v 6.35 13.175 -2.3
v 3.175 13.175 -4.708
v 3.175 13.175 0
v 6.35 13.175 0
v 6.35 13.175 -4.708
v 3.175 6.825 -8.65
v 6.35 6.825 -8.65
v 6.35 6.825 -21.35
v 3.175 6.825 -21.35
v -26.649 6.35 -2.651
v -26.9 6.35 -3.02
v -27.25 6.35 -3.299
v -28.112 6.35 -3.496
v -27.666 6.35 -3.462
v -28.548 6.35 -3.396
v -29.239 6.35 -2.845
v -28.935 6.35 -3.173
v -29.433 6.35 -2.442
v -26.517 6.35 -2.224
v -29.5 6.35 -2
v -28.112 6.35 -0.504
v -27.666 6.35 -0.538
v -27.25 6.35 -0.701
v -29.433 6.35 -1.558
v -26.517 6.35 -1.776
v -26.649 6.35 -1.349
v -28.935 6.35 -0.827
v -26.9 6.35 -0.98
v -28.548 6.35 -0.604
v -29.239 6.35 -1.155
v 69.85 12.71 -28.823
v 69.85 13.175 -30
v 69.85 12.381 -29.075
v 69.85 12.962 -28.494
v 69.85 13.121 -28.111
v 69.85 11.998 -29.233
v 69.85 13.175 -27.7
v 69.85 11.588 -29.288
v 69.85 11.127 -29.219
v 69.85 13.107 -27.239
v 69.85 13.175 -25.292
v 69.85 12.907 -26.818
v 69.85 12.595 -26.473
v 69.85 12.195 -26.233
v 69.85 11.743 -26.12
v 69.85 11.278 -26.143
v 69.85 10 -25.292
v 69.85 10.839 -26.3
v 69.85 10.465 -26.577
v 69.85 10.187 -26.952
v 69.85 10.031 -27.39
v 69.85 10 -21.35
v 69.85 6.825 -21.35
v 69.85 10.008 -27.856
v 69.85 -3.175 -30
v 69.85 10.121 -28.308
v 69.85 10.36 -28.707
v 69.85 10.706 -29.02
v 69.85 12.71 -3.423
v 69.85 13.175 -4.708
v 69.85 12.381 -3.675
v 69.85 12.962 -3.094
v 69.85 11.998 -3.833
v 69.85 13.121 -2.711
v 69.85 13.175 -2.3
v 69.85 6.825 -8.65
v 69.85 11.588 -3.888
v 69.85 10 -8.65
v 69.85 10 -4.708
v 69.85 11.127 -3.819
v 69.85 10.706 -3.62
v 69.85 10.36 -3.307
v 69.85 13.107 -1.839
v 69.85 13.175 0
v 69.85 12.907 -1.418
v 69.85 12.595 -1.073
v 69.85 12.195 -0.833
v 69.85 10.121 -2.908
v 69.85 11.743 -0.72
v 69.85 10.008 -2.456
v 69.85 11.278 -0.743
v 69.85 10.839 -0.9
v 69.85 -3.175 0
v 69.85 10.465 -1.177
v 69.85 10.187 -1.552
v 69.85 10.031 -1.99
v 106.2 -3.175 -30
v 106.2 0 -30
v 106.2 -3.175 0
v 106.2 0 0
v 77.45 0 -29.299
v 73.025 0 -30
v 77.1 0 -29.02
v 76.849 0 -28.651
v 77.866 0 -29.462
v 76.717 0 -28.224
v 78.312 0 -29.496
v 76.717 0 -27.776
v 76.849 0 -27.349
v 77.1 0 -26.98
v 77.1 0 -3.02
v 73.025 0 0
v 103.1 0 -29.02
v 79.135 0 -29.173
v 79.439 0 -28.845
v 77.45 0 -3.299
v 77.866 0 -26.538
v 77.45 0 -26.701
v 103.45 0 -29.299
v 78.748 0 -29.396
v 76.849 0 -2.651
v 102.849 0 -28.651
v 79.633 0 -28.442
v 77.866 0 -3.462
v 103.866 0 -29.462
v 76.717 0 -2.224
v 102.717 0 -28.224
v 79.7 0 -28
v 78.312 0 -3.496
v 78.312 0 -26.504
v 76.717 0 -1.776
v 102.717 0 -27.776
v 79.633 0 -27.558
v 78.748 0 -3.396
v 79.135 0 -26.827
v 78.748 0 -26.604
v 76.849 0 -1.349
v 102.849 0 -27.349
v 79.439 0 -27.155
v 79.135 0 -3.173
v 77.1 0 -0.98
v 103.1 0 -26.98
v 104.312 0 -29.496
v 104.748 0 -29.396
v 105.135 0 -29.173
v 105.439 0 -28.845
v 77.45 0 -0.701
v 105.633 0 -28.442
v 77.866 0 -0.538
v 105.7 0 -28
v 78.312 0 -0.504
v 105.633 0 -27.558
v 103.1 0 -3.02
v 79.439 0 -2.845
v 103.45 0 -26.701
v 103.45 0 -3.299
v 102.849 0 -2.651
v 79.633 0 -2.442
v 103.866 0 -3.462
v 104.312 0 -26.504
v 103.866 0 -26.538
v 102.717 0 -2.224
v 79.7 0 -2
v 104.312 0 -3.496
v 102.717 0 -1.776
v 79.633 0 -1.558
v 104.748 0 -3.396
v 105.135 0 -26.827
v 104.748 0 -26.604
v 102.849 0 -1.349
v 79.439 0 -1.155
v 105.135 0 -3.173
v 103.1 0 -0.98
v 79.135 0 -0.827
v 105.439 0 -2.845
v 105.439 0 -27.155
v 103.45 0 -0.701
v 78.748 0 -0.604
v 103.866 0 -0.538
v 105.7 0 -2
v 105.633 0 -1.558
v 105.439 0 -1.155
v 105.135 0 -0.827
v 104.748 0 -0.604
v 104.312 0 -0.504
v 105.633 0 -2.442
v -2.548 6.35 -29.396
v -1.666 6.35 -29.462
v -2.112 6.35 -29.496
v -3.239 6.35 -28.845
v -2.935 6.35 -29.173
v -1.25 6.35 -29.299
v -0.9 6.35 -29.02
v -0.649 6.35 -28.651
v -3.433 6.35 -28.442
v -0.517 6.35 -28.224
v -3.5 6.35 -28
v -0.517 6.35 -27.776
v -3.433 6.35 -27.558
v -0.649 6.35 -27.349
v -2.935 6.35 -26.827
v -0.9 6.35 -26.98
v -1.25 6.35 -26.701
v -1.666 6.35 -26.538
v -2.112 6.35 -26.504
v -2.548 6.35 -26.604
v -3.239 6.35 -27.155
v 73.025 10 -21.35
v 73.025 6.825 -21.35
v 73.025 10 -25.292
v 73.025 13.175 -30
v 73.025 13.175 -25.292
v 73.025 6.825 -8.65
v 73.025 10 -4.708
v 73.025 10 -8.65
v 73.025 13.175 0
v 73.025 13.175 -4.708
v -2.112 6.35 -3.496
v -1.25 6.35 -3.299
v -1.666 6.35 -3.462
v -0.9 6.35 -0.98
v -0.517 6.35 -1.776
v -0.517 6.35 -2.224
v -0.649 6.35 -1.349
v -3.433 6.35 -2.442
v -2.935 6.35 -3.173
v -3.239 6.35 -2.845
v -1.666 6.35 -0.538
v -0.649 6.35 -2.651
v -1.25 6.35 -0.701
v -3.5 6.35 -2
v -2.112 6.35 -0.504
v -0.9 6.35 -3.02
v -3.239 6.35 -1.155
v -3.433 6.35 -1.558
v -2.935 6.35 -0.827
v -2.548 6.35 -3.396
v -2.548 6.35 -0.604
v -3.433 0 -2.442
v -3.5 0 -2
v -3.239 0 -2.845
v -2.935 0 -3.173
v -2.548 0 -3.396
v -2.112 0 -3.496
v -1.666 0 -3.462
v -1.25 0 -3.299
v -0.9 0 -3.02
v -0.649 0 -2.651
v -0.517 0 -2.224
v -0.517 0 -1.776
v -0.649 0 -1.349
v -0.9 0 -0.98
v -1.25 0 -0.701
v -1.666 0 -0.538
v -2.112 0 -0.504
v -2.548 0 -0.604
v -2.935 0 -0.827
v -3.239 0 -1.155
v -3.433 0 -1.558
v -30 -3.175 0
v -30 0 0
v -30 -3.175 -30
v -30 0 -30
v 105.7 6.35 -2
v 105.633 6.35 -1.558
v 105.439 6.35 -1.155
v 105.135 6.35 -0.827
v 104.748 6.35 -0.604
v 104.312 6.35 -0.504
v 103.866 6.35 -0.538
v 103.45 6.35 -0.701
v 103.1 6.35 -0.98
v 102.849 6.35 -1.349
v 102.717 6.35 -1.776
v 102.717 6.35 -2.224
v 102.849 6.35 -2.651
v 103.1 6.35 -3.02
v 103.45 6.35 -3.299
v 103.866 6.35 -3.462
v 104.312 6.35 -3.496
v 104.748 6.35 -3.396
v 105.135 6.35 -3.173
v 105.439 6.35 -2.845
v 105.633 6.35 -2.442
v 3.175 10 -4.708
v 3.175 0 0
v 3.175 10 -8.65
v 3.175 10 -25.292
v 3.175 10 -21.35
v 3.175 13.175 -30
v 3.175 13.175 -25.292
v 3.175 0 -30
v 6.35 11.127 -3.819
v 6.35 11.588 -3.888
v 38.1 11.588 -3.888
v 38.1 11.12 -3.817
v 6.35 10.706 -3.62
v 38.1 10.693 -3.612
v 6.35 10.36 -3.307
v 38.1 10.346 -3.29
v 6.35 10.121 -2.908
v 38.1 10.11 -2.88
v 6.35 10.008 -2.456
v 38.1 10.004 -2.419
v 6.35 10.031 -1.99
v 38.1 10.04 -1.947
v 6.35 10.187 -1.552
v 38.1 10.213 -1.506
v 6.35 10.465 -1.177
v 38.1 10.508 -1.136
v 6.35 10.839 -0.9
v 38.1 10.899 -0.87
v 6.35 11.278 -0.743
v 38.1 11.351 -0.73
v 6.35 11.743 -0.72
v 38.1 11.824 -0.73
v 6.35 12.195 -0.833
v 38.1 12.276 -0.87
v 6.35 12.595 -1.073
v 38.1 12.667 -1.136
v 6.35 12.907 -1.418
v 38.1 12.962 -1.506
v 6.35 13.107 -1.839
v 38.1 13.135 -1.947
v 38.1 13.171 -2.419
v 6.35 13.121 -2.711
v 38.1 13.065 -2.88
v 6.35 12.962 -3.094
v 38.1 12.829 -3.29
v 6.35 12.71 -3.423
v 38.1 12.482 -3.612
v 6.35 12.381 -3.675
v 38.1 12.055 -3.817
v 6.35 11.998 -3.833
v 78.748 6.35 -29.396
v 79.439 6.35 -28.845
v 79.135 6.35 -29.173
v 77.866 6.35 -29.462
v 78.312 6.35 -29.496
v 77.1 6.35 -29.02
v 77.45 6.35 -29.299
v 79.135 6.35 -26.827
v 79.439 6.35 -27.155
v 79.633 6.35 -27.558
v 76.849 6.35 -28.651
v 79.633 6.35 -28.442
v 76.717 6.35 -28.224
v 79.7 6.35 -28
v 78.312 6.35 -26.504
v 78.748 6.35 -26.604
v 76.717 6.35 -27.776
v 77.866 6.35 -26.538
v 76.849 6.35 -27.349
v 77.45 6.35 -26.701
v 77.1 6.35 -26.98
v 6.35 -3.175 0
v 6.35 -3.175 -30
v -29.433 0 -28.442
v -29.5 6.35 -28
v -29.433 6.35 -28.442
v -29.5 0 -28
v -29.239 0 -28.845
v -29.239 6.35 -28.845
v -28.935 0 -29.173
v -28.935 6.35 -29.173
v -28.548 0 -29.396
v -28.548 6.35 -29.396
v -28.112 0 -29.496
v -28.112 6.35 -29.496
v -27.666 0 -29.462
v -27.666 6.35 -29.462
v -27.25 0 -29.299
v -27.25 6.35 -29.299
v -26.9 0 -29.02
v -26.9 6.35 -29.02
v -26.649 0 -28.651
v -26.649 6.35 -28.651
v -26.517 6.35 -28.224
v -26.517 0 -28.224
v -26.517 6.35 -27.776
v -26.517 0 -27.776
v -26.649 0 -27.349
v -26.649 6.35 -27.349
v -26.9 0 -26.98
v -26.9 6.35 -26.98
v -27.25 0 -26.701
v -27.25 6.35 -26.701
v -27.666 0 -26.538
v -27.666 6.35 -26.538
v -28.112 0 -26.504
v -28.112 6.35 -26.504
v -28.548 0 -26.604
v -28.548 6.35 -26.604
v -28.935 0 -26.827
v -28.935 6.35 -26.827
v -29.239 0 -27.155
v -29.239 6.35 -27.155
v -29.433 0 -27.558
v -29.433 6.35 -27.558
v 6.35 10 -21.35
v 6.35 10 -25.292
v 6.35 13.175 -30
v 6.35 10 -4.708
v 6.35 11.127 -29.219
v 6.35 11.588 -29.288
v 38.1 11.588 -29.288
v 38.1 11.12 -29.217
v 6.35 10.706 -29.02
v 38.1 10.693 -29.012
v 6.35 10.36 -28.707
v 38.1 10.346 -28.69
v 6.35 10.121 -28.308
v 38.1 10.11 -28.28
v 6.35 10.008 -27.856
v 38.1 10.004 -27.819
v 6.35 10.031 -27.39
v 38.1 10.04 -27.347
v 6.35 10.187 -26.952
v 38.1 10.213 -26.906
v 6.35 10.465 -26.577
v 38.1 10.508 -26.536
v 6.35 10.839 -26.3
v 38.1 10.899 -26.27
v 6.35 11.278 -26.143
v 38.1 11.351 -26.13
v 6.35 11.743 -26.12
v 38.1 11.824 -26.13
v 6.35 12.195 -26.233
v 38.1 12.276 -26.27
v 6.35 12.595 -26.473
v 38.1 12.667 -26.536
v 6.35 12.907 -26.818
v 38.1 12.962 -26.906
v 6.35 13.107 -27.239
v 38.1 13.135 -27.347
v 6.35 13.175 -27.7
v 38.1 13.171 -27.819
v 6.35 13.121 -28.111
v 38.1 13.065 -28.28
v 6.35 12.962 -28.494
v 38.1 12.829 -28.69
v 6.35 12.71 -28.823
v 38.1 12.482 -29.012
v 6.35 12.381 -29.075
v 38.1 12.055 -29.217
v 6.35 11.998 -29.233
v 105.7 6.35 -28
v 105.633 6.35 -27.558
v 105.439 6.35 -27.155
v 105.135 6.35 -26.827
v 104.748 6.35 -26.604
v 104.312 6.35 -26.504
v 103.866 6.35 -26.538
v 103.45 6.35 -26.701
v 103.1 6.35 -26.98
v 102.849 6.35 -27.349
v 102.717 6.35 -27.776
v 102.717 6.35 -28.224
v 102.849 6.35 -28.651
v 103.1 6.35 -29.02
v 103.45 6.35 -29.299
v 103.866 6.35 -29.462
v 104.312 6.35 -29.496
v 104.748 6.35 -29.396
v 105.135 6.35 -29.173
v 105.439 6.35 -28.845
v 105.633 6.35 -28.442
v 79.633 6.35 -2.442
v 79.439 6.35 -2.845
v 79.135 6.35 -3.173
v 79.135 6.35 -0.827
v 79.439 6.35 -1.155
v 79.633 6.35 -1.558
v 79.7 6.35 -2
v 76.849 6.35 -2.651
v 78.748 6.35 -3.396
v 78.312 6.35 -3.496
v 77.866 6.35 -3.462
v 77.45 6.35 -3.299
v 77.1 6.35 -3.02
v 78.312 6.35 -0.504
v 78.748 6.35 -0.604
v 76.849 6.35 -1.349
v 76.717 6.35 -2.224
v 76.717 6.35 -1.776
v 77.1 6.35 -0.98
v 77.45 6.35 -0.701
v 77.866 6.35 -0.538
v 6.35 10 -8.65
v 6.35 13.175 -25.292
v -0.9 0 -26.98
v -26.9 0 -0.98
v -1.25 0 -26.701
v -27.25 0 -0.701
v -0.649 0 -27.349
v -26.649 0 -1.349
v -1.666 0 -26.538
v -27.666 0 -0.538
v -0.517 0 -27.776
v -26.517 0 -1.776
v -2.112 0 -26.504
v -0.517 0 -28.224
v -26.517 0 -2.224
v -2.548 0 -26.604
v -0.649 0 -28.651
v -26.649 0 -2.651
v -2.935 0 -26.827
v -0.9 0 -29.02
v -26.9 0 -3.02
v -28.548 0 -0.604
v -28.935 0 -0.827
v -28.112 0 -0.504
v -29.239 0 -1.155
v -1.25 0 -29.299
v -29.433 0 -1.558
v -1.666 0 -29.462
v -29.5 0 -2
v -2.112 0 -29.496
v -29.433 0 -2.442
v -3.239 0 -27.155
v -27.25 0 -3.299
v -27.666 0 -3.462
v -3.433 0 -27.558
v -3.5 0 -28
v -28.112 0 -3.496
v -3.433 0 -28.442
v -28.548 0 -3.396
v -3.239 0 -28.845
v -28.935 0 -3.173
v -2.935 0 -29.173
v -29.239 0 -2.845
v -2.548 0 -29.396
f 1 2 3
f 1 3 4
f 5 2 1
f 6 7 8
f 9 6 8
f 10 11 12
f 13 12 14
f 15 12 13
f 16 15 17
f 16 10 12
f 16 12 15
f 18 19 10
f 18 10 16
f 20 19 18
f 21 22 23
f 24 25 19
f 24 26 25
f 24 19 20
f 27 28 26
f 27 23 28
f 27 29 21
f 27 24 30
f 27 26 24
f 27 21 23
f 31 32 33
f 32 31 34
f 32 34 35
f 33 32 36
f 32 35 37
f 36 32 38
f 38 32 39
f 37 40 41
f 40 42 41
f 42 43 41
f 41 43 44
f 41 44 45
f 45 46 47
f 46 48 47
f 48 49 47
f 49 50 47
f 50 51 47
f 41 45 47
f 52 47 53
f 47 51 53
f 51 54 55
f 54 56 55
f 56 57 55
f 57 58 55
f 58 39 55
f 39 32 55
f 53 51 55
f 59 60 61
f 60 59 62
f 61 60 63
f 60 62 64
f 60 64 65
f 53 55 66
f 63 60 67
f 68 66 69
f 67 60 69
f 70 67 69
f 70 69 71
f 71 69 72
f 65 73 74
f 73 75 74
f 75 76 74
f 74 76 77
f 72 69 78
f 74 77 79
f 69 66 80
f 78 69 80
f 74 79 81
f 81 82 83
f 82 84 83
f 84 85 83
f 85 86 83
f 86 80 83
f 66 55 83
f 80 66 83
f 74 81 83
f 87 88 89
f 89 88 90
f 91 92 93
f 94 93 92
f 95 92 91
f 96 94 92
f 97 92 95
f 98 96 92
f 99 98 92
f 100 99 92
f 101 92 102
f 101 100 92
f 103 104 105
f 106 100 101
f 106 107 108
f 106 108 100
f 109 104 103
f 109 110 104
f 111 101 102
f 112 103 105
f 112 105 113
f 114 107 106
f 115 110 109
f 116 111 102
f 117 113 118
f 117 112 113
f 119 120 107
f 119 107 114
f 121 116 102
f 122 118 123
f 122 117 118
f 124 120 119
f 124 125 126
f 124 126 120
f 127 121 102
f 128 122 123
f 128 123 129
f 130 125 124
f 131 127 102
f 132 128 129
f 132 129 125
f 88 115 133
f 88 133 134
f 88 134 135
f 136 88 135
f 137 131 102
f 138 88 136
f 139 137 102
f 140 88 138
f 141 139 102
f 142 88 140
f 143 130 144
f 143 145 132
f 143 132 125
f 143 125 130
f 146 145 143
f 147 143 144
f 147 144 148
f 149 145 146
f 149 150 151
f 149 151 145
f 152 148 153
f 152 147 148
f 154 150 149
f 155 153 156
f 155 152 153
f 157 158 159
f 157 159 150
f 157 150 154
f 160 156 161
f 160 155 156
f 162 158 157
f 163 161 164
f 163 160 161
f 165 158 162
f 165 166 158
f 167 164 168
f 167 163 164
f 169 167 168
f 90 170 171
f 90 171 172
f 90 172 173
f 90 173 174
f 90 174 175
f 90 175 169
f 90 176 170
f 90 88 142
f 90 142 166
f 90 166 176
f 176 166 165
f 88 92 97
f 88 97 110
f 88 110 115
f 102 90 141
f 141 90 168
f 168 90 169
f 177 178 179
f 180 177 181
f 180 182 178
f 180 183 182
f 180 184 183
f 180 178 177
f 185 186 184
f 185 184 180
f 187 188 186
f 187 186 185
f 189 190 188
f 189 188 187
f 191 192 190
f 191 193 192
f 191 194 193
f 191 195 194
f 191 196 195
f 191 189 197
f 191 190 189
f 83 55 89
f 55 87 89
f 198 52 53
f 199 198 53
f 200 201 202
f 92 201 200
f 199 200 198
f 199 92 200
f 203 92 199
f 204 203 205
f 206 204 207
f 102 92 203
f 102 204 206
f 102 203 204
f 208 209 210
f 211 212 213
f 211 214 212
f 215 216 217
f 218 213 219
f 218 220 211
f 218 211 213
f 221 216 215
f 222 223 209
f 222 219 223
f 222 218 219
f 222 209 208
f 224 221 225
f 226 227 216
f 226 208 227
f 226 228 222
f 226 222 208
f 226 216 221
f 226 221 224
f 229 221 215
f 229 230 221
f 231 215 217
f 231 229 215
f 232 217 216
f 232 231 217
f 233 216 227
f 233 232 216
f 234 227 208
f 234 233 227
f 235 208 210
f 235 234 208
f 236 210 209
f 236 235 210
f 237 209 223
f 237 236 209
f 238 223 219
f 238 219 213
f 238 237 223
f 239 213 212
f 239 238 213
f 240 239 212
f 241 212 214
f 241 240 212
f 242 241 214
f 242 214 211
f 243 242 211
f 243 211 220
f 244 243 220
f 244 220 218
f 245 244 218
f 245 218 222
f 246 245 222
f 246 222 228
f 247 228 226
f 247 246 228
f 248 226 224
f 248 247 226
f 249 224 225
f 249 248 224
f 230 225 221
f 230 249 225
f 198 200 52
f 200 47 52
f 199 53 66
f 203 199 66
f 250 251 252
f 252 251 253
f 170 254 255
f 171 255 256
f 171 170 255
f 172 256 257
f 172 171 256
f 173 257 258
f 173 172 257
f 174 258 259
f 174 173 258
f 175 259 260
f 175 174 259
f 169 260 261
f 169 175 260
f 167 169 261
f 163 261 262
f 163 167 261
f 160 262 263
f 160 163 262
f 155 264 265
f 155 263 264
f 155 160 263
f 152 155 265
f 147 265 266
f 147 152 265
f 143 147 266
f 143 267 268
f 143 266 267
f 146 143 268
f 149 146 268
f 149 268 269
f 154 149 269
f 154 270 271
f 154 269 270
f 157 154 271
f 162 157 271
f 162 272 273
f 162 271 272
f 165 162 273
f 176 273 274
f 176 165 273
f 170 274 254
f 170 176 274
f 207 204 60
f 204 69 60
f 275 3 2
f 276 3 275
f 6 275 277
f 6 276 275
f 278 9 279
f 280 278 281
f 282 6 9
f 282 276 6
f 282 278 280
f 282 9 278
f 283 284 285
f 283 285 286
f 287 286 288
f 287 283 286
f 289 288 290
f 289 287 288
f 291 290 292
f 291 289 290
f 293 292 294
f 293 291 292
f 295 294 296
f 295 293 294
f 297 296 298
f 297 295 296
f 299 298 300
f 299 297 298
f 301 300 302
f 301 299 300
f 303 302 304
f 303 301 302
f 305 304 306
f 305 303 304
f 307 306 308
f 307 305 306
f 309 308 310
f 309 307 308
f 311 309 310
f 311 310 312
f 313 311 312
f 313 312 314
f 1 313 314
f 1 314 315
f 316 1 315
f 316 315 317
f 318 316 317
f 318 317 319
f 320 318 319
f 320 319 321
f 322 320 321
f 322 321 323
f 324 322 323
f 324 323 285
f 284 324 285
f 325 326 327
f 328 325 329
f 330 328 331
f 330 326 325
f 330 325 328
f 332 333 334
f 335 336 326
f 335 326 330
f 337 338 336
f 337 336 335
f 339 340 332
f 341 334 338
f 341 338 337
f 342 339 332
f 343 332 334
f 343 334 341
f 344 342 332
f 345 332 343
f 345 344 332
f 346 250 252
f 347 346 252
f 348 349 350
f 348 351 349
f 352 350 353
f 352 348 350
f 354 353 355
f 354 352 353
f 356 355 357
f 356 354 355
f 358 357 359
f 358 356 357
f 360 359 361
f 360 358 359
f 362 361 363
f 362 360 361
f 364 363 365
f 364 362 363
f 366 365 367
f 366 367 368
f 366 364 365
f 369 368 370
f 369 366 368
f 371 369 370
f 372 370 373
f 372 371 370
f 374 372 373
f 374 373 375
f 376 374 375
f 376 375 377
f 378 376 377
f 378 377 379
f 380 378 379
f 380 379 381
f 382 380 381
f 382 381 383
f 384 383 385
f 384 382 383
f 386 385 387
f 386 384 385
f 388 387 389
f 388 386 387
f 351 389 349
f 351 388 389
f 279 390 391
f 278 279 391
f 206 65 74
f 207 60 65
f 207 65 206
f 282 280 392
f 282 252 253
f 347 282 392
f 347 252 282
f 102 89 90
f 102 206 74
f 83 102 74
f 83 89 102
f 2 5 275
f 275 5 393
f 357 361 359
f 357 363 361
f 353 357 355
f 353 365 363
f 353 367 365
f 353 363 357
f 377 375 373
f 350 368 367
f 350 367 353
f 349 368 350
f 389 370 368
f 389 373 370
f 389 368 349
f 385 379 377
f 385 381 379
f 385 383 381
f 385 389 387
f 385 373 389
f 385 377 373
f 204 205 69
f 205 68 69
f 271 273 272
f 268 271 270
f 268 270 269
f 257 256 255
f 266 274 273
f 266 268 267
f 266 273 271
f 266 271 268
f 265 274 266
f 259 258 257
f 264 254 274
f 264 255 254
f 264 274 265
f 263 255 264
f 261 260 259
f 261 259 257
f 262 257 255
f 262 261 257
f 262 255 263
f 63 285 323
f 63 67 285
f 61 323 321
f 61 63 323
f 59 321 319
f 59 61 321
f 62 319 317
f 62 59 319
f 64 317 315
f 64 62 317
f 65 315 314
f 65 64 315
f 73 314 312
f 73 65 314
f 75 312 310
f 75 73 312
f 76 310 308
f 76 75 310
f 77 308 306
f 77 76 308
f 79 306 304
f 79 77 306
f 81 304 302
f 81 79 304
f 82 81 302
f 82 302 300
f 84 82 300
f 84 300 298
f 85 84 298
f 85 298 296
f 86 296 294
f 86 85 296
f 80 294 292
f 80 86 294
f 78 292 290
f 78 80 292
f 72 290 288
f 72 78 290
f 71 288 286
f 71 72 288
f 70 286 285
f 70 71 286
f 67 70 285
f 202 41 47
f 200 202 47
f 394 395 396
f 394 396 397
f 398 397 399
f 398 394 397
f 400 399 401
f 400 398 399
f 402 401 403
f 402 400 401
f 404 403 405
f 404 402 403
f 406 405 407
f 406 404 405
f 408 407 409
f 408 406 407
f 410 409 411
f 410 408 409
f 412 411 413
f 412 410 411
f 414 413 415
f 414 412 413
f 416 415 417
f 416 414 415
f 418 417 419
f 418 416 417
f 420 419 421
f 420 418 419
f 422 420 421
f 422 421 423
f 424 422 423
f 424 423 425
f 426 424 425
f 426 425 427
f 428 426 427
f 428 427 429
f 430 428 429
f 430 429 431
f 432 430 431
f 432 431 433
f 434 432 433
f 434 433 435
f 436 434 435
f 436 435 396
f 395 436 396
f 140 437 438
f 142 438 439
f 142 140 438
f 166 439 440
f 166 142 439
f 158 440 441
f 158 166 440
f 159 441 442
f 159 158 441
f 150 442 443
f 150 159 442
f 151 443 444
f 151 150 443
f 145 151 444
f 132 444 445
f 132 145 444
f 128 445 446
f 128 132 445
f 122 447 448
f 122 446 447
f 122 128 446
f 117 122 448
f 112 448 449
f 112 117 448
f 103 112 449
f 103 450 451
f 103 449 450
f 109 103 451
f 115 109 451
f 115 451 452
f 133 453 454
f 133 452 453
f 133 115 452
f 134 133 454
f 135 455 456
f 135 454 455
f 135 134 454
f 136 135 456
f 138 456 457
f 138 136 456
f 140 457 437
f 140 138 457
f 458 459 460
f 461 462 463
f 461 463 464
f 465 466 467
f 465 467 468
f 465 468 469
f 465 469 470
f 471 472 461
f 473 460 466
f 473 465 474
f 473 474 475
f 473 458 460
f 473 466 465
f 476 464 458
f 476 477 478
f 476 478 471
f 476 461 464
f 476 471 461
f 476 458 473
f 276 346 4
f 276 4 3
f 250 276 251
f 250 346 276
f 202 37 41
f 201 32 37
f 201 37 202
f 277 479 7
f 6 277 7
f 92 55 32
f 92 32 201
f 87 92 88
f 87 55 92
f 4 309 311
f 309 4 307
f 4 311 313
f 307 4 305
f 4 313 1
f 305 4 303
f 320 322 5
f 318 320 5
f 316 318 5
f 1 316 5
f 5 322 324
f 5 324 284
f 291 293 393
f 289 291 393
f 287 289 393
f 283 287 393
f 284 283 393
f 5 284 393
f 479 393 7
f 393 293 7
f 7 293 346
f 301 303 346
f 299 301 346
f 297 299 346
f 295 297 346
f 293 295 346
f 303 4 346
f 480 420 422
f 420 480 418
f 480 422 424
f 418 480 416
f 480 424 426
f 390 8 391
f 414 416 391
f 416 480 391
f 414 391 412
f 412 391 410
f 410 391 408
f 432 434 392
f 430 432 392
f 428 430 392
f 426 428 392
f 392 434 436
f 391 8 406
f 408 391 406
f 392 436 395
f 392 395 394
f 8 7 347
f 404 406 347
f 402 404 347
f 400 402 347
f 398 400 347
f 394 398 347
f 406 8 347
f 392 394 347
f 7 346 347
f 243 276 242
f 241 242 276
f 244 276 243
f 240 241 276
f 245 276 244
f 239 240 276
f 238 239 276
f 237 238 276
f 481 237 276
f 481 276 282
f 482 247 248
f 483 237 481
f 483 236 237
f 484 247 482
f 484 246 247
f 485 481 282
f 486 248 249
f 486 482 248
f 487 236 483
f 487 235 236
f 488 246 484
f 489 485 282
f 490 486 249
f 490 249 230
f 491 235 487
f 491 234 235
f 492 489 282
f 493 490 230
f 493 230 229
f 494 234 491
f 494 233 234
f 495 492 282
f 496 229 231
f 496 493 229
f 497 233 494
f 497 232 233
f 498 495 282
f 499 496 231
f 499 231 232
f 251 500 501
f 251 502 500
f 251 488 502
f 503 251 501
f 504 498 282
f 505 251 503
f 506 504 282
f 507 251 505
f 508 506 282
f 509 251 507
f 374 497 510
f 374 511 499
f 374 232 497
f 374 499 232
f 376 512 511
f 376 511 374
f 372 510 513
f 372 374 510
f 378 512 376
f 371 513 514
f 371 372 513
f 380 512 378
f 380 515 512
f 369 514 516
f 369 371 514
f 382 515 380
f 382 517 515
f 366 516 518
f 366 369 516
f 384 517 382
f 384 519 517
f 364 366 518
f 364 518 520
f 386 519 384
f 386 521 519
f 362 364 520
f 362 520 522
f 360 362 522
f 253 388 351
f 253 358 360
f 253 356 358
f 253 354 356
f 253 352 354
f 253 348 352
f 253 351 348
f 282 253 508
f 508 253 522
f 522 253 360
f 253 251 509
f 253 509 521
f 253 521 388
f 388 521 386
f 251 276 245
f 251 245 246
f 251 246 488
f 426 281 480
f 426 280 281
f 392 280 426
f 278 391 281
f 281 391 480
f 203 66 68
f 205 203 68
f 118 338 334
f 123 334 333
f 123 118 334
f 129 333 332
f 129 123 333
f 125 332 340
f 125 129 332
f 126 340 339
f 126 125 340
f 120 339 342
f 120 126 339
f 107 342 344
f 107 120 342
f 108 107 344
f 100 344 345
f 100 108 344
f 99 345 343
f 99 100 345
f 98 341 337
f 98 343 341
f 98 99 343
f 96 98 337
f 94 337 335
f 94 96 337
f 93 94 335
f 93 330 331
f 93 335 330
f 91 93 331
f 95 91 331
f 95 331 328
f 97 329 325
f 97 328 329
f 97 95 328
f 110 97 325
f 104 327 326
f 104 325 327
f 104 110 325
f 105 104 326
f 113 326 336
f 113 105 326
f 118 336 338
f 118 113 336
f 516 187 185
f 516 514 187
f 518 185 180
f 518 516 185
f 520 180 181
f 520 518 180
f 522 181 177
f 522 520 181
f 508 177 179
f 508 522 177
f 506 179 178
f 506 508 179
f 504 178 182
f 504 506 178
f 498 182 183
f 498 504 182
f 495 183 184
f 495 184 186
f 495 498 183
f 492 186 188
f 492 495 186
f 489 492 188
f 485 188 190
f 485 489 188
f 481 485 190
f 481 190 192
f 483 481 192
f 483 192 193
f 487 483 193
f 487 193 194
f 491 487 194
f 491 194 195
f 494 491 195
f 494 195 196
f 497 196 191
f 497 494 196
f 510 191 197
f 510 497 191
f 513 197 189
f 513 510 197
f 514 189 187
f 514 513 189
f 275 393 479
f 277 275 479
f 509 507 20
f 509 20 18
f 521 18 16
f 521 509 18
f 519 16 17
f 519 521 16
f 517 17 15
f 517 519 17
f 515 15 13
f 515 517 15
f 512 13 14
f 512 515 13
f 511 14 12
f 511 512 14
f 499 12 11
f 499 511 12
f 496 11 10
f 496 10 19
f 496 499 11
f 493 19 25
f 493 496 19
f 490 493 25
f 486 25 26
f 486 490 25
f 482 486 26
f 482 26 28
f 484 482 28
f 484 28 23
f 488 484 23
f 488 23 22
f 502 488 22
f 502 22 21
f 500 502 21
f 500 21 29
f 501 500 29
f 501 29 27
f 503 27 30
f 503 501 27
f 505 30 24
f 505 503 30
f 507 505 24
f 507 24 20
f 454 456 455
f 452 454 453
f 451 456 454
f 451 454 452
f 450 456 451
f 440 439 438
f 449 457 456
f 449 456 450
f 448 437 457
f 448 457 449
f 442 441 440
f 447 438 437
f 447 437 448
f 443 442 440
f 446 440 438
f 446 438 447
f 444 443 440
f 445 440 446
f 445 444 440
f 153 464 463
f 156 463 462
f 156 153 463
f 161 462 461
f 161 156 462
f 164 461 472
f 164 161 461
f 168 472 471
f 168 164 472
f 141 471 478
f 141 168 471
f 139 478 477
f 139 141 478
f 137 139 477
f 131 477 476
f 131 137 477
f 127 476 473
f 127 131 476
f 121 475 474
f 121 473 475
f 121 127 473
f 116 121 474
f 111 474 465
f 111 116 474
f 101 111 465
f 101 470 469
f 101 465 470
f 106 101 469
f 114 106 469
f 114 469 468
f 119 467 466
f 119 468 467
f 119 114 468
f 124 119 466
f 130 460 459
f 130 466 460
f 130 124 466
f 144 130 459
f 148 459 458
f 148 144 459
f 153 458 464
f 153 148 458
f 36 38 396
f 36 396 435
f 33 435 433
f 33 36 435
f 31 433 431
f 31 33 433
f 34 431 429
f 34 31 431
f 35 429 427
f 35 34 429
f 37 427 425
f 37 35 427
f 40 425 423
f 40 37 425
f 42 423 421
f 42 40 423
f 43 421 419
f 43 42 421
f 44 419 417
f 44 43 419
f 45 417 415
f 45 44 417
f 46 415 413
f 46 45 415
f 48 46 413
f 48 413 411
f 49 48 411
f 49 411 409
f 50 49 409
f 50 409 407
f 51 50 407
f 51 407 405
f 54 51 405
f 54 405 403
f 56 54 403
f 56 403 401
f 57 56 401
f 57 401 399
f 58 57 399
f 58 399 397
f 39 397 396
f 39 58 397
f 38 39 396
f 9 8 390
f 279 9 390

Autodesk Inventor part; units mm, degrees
ref_plane "YZ Plane" through (0, 0, 0) normal (1, 0, 0) x (0, 1, 0)
ref_plane "XZ Plane" through (0, 0, 0) normal (0, 1, 0) x (-1, 0, 0)
ref_plane "XY Plane" through (0, 0, 0) normal (0, 0, 1) x (1, 0, 0)
sketch "Sketch1" plane through (0, 0, 0) normal (0, 1, 0) x (-1, 0, 0)
  line L0 (0, 0) -> (30, 0)
  line L1 (30, 0) -> (30, -30)
  line L2 (30, -30) -> (0, -30)
  line L3 (0, -30) -> (0, 0)
  line L4 (28, -2) -> (2, -2)
  line L5 (2, -2) -> (2, -28)
  line L6 (2, -28) -> (28, -28)
  line L7 (28, -28) -> (28, -2)
  line L8 (28, -2) -> (2, -28) construction
  line L9 (2, -2) -> (28, -28) construction
  circle A0 centre (28, -2) radius 1.5
  circle A1 centre (28, -28) radius 1.5
  circle A2 centre (2, -2) radius 1.5
  circle A3 centre (2, -28) radius 1.5
  point P0 (15, -15)
  dimension "d0" = 30
  dimension "d1" = 30
  dimension "d2" = 26
  dimension "d3" = 26
  dimension "d4" = 3
  dimension "d7" = 26
  dimension "d10" = 26
extrude "Extrusion1" add sketch "Sketch1" against normal blind 3.175 contours L0 L1 L2 L3 | A2 L5 L4 | L4 L5 A2 | L4 A0 L7 A1 L6 A3 L5 A2 | A0 L7 L4 | L4 L7 A0 | A3 L6 L5 | L5 L6 A3 | A1 L6 L7 | L7 L6 A1
extrude "Extrusion2" add sketch "Sketch1" along normal blind 6.35 contours A2 L5 L4 | L4 L5 A2 | A0 L7 L4 | L4 L7 A0 | A3 L6 L5 | L5 L6 A3 | A1 L6 L7 | L7 L6 A1
sketch "Sketch2" plane through (0, 0, 0) normal (1, 0, 0) x (0, 0, -1)
  line L0 (0, 0) -> (0, -3.175) projected
  line L1 (0, 0) -> (30, 0) projected
  line L2 (0, -3.175) -> (30, -3.175)
  line L3 (30, -3.175) -> (30, 0)
  line L4 (30, 0) -> (0, 0)
  line L5 (0, 0) -> (0, -3.175)
extrude "Extrusion3" add sketch "Sketch2" along normal blind 6.35
sketch "Sketch3" plane through (0, 0, 0) normal (0, 1, 0) x (1, 0, 0)
  line L0 (6.35, 0) -> (6.35, 30) projected
  line L1 (-30, 30) -> (6.35, 30) projected
  line L2 (6.35, 0) -> (3.175, 0)
  line L3 (3.175, 0) -> (3.175, 30)
  line L4 (3.175, 30) -> (6.35, 30)
  line L5 (6.35, 30) -> (6.35, 0)
  point P0 (0, 0)
  dimension "d19" = 3.175
extrude "Extrusion4" add sketch "Sketch3" along normal blind 13.175
sketch "Sketch4" plane through (6.35, 0, 0) normal (1, 0, 0) x (0, 0, -1)
  line L0 (30, 13.175) -> (0, 13.175) projected
  line L1 (30, 0) -> (30, 13.175) projected
  line L2 (0, 13.175) -> (30, 13.175)
  line L3 (15, 13.175) -> (15, 11.5875)
  line L4 (15, 11.5875) -> (27.7, 11.5875)
  line L5 (27.7, 11.5875) -> (2.3, 11.5875)
  circle A0 centre (2.3, 11.5875) radius 1.5875
  circle A1 centre (27.7, 11.5875) radius 1.5875
  line L6 (4.7076, 10) -> (25.2924, 10)
  line L7 (25.2924, 10) -> (25.2924, 13.175)
  line L8 (25.2924, 13.175) -> (4.7076, 13.175)
  line L9 (4.7076, 13.175) -> (4.7076, 10)
  line L10 (4.7076, 10) -> (25.2924, 13.175) construction
  line L11 (25.2924, 10) -> (4.7076, 13.175) construction
  line L12 (8.65, 6.825) -> (21.35, 6.825)
  line L13 (21.35, 6.825) -> (21.35, 13.175)
  line L14 (21.35, 13.175) -> (8.65, 13.175)
  line L15 (8.65, 13.175) -> (8.65, 6.825)
  line L16 (8.65, 6.825) -> (21.35, 13.175) construction
  line L17 (21.35, 6.825) -> (8.65, 13.175) construction
  point P0 (0, 0)
  point P1 (15, 10)
  point P2 (21.35, 10)
  point P3 (8.65, 10)
  dimension "d22" = 1.5875
  dimension "d23" = 12.7
  dimension "d24" = 90
  dimension "d25" = 25.4
  dimension "d26" = 3.175
  dimension "d27" = 3.175
extrude "Extrusion5" add sketch "Sketch4" along normal blind 31.75 contours A1 | A0
extrude "Extrusion6" cut sketch "Sketch4" against normal blind 3.175 contours L7 L4 L13 L0 | L13 L4 L3 L0 | L7 L6 L13 L4 | L3 L5 L15 L0 | L13 L6 L15 L5 L4 | L15 L5 L9 L0 | L13 L12 L15 L6 | L15 L6 L9 L5
mirror "Mirror1" about plane through (38.1, 11.5875, -27.7) normal (1, 0, 0) of "Extrusion1", "Extrusion2", "Extrusion3", "Extrusion4", "Extrusion5", "Extrusion6"
properties part number "CDSAXS-Capillary-Frame-For2Sensors"
